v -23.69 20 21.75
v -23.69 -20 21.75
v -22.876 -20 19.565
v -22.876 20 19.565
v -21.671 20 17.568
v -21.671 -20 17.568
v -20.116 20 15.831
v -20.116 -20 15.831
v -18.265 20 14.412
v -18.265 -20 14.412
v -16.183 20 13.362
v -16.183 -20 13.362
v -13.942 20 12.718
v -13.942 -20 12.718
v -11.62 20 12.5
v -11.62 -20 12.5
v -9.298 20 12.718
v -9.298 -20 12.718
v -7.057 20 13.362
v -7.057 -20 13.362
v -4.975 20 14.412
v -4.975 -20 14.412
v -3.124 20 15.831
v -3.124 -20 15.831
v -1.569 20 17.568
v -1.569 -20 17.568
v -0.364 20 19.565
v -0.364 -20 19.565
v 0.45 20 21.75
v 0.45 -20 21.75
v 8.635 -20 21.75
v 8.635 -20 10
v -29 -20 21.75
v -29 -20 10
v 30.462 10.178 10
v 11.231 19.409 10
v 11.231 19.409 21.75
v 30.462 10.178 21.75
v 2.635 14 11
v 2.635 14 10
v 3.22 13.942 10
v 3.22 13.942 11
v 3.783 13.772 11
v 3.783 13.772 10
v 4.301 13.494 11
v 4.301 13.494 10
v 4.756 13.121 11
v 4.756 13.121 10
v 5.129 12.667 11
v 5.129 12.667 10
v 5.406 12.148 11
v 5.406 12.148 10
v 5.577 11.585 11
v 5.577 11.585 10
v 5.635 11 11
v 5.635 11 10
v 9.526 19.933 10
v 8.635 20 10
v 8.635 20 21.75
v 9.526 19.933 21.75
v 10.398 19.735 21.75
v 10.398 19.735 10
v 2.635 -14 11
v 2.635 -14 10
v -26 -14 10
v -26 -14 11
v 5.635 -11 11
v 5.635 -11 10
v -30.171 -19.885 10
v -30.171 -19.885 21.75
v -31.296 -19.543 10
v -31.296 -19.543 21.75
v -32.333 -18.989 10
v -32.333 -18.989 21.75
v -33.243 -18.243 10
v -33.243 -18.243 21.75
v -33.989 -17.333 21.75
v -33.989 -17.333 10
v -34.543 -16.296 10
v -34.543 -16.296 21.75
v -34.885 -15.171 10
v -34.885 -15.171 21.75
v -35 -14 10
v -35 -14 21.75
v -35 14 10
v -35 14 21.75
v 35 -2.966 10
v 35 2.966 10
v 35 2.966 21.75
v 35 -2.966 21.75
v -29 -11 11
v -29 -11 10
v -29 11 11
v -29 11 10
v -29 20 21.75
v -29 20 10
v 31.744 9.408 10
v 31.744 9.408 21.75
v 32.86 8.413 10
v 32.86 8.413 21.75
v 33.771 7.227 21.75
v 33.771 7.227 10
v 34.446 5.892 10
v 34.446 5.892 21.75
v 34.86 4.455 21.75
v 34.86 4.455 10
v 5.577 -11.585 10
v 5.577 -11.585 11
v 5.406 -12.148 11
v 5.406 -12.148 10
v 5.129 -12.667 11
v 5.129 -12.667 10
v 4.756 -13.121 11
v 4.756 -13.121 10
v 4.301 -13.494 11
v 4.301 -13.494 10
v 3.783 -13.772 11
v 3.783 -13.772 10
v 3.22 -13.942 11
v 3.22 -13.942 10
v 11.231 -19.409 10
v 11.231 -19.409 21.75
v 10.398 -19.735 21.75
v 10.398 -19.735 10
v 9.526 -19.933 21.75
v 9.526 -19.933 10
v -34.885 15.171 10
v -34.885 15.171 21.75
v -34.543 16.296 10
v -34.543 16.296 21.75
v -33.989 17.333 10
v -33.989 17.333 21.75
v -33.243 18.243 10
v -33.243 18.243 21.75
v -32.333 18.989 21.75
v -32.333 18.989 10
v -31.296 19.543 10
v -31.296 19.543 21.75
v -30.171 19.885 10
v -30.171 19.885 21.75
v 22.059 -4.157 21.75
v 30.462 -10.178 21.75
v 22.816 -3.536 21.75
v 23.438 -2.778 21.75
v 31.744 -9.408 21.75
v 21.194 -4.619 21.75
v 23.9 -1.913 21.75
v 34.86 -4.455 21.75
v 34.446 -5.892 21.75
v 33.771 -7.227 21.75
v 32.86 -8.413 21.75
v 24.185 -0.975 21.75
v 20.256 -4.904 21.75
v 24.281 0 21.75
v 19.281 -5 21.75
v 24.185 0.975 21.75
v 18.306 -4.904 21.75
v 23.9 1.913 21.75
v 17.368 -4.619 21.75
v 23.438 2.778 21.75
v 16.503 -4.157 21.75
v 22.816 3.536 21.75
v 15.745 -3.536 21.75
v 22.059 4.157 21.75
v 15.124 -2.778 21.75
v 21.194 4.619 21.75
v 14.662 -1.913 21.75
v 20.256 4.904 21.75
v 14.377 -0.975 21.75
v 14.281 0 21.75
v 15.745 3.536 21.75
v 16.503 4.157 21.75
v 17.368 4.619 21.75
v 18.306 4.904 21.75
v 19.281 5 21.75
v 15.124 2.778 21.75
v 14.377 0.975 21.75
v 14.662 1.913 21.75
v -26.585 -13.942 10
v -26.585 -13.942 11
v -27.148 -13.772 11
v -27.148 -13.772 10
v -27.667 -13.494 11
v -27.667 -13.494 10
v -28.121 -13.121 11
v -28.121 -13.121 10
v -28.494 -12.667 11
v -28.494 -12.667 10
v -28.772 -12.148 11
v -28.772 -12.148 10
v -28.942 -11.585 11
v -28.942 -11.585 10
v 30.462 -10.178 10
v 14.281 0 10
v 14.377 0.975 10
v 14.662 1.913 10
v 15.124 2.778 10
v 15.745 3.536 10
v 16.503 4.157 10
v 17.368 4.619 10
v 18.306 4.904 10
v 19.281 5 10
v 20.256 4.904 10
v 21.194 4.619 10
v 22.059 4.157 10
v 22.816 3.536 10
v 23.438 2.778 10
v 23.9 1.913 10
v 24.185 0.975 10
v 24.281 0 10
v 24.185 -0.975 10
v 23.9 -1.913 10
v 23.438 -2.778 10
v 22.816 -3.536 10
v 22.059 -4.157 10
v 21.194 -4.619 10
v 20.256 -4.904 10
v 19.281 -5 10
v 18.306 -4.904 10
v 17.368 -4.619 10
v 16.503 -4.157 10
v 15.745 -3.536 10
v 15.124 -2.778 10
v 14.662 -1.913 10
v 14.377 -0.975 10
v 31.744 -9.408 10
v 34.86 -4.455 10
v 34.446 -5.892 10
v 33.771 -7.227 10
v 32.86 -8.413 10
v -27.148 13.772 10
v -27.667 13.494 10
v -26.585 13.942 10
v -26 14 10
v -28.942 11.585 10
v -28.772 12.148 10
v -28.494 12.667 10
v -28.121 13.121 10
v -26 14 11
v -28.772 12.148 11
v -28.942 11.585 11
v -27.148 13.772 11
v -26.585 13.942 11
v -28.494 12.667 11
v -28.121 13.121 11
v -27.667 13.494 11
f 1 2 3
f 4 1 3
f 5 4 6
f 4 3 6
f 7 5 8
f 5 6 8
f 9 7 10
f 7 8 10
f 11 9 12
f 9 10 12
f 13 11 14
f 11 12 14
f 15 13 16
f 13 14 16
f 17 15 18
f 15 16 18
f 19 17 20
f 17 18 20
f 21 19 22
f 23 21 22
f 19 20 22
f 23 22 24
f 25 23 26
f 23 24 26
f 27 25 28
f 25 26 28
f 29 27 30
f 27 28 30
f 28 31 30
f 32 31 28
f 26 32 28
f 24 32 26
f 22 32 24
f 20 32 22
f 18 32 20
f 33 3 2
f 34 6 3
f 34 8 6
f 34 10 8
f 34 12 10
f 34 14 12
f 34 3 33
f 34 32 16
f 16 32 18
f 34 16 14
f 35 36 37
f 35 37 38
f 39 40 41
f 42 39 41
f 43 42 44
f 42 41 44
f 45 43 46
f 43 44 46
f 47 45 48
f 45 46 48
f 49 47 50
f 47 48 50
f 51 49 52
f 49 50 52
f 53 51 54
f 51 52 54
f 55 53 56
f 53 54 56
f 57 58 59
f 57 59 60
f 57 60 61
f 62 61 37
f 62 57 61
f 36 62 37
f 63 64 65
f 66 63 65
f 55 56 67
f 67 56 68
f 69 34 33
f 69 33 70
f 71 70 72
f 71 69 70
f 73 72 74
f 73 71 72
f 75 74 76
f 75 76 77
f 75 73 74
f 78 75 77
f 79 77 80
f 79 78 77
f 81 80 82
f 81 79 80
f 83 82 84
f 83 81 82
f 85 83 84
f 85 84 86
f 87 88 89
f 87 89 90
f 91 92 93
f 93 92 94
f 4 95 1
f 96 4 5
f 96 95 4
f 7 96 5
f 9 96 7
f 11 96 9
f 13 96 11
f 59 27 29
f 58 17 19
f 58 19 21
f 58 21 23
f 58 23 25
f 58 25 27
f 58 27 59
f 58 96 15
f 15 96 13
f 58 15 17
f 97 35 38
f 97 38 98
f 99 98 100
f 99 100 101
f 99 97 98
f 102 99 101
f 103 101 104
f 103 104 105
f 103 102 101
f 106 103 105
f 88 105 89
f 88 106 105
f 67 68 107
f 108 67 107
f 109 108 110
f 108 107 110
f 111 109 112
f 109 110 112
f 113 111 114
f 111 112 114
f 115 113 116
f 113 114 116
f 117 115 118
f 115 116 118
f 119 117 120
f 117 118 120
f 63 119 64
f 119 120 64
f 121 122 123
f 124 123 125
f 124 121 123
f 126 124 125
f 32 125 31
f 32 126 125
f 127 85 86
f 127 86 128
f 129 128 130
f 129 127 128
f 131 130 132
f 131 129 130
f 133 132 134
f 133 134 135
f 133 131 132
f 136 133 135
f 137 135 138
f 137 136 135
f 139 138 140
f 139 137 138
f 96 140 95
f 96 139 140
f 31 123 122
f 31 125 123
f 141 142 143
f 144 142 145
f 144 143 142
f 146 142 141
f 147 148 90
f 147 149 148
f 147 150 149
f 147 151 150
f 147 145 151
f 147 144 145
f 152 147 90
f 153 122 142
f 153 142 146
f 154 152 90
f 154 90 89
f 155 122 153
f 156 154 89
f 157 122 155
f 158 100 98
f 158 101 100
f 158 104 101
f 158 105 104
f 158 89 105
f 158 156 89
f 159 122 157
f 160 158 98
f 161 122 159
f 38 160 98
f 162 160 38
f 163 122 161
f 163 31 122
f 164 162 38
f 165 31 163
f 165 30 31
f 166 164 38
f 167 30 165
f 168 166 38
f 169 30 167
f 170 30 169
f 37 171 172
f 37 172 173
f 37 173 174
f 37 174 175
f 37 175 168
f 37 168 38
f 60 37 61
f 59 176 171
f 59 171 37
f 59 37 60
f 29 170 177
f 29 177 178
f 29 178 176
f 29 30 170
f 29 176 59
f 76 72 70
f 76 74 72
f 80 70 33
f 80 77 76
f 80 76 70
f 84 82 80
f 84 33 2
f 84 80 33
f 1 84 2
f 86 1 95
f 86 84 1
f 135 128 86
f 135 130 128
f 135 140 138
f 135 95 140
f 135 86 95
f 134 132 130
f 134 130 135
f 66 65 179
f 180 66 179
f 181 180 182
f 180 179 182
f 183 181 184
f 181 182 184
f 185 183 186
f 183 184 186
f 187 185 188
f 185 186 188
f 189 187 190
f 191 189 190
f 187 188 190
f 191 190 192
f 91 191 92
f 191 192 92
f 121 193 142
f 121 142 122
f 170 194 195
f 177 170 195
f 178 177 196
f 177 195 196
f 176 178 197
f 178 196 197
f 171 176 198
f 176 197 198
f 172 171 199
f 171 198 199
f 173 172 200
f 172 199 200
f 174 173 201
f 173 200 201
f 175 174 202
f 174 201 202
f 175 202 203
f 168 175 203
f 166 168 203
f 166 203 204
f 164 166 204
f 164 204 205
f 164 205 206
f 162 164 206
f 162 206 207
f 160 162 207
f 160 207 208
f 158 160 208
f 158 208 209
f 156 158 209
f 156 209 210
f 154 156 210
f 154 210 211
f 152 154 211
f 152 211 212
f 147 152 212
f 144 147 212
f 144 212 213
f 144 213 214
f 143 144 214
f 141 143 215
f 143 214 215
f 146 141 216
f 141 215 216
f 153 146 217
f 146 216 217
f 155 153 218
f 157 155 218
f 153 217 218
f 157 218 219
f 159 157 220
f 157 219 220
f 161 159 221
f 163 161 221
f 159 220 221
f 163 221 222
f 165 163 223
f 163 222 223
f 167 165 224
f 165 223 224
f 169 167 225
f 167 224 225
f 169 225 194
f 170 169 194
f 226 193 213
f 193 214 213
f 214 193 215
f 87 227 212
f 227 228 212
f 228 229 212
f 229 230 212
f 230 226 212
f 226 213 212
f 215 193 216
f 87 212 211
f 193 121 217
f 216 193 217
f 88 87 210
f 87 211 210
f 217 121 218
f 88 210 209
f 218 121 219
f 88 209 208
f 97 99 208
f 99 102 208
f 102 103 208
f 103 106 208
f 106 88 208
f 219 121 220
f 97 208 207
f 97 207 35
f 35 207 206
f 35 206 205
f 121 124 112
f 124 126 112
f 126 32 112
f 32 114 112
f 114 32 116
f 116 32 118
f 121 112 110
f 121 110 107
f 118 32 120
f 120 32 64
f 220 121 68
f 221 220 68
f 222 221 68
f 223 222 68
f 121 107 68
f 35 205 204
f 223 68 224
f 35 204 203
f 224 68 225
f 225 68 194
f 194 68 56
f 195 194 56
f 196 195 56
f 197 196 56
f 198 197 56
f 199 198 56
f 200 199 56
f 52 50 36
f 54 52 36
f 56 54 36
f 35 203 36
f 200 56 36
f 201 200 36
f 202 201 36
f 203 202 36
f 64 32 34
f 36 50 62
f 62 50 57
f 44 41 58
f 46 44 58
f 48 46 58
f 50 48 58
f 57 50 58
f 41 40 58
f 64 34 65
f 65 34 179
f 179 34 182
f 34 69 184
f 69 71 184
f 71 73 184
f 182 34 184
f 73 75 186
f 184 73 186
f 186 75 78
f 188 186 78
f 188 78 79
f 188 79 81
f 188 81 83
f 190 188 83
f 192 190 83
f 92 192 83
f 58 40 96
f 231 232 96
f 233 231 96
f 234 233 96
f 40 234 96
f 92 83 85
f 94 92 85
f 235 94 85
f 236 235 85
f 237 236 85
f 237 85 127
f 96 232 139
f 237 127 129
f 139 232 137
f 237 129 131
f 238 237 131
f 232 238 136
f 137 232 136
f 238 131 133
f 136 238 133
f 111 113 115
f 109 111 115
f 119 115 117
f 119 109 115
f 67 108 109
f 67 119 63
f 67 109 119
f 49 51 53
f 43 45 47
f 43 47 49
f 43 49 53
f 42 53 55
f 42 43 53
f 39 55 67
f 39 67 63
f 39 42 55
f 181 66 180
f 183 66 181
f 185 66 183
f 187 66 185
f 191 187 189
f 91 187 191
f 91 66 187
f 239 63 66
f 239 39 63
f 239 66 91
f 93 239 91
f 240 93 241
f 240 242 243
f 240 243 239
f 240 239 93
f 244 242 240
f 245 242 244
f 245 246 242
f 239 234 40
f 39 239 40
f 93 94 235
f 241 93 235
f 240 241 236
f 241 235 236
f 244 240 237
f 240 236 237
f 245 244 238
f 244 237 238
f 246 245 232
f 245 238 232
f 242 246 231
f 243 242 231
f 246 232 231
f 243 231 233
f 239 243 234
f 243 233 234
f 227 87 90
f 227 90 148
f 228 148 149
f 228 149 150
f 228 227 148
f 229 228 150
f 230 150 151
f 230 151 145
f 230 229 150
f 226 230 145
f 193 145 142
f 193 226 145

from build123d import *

# Parameters (mm, degrees)
BOSS_EXTRUDE1_DEPTH = 25
CUT_EXTRUDE2_DEPTH  = 59.736700622
SKETCH4_W           = 10
SKETCH4_H           = 40
CUT_EXTRUDE3_DEPTH  = 57.5
CUT_EXTRUDE4_DEPTH  = 1
SKETCH6_R           = 5
CUT_EXTRUDE5_DEPTH  = 44.011626335
SKETCH9_W           = 3.25
SKETCH9_H           = 40
CUT_EXTRUDE6_DEPTH  = 77.974021592


with BuildPart() as part:
    # Sketch1 → Boss-Extrude1 (new body)
    with BuildSketch(Plane.XY):
        with BuildLine():
            Line((-35, -14), (-35, 14))
            ThreePointArc((-35, 14), (-33.242640687, 18.242640687), (-29, 20))
            Line((-29, 20), (8.634575376, 20))
            ThreePointArc((8.634575376, 20), (9.965959981, 19.850420073), (11.230961782, 19.409138345))
            Line((11.230961782, 19.409138345), (30.461848541, 10.1783127))
            ThreePointArc((30.461848541, 10.1783127), (33.771070385, 7.22671574), (35, 2.966128241))
            Line((35, 2.966128241), (35, -2.966128241))
            ThreePointArc((35, -2.966128241), (33.771070385, -7.22671574), (30.461848541, -10.1783127))
            Line((30.461848541, -10.1783127), (11.230961782, -19.409138345))
            ThreePointArc((11.230961782, -19.409138345), (9.965959981, -19.850420073), (8.634575376, -20))
            Line((8.634575376, -20), (-29, -20))
            ThreePointArc((-29, -20), (-33.242640687, -18.242640687), (-35, -14))
        make_face()
    extrude(amount=BOSS_EXTRUDE1_DEPTH)

    # Sketch3 → Cut-Extrude2 (cut, through all)
    with BuildSketch(Plane(origin=(0, -20, 0), x_dir=(-1, 0, 0), z_dir=(0, -1, 0))):
        with BuildLine():
            Line((-0.88003088, -25), (24.11996912, -25))
            ThreePointArc((24.11996912, -25), (11.61996912, -12.5), (-0.88003088, -25))
        make_face()
        Polygon((11.619969205, -10), (29, -10), (29, 0), (-8.634575376, 0), (-8.634575376, -10), align=None)
    extrude(amount=-CUT_EXTRUDE2_DEPTH, mode=Mode.SUBTRACT)

    # Sketch4 → Cut-Extrude3 (cut, symmetric)
    with BuildSketch(Plane.ZY.offset(-8.634575376)):
        with Locations((5, 0)):
            Rectangle(SKETCH4_W, SKETCH4_H)
    extrude(amount=CUT_EXTRUDE3_DEPTH, both=True, mode=Mode.SUBTRACT)

    # Sketch5 → Cut-Extrude4 (cut)
    with BuildSketch(Plane(origin=(0, 0, 10), x_dir=(-1, 0, 0), z_dir=(0, 0, -1))):
        with BuildLine():
            Line((-2.634575376, -14), (26, -14))
            ThreePointArc((26, -14), (28.121320344, -13.121320344), (29, -11))
            Line((29, -11), (29, 11))
            ThreePointArc((29, 11), (28.121320344, 13.121320344), (26, 14))
            Line((26, 14), (-2.634575376, 14))
            ThreePointArc((-2.634575376, 14), (-4.75589572, 13.121320344), (-5.634575376, 11))
            Line((-5.634575376, 11), (-5.634575376, -11))
            ThreePointArc((-5.634575376, -11), (-4.75589572, -13.121320344), (-2.634575376, -14))
        make_face()
    extrude(amount=-CUT_EXTRUDE4_DEPTH, mode=Mode.SUBTRACT)

    # Sketch6 → Cut-Extrude5 (cut, through all)
    with BuildSketch(Plane(origin=(0, 0, 10), x_dir=(-1, 0, 0), z_dir=(0, 0, -1))):
        with Locations((-19.280961782, 0)):
            Circle(SKETCH6_R)
    extrude(amount=-CUT_EXTRUDE5_DEPTH, mode=Mode.SUBTRACT)

    # Sketch9 → Cut-Extrude6 (cut, through all)
    with BuildSketch(Plane.ZY.offset(35)):
        with Locations((23.375, 0)):
            Rectangle(SKETCH9_W, SKETCH9_H)
    extrude(amount=-CUT_EXTRUDE6_DEPTH, mode=Mode.SUBTRACT)


solid = part.part
